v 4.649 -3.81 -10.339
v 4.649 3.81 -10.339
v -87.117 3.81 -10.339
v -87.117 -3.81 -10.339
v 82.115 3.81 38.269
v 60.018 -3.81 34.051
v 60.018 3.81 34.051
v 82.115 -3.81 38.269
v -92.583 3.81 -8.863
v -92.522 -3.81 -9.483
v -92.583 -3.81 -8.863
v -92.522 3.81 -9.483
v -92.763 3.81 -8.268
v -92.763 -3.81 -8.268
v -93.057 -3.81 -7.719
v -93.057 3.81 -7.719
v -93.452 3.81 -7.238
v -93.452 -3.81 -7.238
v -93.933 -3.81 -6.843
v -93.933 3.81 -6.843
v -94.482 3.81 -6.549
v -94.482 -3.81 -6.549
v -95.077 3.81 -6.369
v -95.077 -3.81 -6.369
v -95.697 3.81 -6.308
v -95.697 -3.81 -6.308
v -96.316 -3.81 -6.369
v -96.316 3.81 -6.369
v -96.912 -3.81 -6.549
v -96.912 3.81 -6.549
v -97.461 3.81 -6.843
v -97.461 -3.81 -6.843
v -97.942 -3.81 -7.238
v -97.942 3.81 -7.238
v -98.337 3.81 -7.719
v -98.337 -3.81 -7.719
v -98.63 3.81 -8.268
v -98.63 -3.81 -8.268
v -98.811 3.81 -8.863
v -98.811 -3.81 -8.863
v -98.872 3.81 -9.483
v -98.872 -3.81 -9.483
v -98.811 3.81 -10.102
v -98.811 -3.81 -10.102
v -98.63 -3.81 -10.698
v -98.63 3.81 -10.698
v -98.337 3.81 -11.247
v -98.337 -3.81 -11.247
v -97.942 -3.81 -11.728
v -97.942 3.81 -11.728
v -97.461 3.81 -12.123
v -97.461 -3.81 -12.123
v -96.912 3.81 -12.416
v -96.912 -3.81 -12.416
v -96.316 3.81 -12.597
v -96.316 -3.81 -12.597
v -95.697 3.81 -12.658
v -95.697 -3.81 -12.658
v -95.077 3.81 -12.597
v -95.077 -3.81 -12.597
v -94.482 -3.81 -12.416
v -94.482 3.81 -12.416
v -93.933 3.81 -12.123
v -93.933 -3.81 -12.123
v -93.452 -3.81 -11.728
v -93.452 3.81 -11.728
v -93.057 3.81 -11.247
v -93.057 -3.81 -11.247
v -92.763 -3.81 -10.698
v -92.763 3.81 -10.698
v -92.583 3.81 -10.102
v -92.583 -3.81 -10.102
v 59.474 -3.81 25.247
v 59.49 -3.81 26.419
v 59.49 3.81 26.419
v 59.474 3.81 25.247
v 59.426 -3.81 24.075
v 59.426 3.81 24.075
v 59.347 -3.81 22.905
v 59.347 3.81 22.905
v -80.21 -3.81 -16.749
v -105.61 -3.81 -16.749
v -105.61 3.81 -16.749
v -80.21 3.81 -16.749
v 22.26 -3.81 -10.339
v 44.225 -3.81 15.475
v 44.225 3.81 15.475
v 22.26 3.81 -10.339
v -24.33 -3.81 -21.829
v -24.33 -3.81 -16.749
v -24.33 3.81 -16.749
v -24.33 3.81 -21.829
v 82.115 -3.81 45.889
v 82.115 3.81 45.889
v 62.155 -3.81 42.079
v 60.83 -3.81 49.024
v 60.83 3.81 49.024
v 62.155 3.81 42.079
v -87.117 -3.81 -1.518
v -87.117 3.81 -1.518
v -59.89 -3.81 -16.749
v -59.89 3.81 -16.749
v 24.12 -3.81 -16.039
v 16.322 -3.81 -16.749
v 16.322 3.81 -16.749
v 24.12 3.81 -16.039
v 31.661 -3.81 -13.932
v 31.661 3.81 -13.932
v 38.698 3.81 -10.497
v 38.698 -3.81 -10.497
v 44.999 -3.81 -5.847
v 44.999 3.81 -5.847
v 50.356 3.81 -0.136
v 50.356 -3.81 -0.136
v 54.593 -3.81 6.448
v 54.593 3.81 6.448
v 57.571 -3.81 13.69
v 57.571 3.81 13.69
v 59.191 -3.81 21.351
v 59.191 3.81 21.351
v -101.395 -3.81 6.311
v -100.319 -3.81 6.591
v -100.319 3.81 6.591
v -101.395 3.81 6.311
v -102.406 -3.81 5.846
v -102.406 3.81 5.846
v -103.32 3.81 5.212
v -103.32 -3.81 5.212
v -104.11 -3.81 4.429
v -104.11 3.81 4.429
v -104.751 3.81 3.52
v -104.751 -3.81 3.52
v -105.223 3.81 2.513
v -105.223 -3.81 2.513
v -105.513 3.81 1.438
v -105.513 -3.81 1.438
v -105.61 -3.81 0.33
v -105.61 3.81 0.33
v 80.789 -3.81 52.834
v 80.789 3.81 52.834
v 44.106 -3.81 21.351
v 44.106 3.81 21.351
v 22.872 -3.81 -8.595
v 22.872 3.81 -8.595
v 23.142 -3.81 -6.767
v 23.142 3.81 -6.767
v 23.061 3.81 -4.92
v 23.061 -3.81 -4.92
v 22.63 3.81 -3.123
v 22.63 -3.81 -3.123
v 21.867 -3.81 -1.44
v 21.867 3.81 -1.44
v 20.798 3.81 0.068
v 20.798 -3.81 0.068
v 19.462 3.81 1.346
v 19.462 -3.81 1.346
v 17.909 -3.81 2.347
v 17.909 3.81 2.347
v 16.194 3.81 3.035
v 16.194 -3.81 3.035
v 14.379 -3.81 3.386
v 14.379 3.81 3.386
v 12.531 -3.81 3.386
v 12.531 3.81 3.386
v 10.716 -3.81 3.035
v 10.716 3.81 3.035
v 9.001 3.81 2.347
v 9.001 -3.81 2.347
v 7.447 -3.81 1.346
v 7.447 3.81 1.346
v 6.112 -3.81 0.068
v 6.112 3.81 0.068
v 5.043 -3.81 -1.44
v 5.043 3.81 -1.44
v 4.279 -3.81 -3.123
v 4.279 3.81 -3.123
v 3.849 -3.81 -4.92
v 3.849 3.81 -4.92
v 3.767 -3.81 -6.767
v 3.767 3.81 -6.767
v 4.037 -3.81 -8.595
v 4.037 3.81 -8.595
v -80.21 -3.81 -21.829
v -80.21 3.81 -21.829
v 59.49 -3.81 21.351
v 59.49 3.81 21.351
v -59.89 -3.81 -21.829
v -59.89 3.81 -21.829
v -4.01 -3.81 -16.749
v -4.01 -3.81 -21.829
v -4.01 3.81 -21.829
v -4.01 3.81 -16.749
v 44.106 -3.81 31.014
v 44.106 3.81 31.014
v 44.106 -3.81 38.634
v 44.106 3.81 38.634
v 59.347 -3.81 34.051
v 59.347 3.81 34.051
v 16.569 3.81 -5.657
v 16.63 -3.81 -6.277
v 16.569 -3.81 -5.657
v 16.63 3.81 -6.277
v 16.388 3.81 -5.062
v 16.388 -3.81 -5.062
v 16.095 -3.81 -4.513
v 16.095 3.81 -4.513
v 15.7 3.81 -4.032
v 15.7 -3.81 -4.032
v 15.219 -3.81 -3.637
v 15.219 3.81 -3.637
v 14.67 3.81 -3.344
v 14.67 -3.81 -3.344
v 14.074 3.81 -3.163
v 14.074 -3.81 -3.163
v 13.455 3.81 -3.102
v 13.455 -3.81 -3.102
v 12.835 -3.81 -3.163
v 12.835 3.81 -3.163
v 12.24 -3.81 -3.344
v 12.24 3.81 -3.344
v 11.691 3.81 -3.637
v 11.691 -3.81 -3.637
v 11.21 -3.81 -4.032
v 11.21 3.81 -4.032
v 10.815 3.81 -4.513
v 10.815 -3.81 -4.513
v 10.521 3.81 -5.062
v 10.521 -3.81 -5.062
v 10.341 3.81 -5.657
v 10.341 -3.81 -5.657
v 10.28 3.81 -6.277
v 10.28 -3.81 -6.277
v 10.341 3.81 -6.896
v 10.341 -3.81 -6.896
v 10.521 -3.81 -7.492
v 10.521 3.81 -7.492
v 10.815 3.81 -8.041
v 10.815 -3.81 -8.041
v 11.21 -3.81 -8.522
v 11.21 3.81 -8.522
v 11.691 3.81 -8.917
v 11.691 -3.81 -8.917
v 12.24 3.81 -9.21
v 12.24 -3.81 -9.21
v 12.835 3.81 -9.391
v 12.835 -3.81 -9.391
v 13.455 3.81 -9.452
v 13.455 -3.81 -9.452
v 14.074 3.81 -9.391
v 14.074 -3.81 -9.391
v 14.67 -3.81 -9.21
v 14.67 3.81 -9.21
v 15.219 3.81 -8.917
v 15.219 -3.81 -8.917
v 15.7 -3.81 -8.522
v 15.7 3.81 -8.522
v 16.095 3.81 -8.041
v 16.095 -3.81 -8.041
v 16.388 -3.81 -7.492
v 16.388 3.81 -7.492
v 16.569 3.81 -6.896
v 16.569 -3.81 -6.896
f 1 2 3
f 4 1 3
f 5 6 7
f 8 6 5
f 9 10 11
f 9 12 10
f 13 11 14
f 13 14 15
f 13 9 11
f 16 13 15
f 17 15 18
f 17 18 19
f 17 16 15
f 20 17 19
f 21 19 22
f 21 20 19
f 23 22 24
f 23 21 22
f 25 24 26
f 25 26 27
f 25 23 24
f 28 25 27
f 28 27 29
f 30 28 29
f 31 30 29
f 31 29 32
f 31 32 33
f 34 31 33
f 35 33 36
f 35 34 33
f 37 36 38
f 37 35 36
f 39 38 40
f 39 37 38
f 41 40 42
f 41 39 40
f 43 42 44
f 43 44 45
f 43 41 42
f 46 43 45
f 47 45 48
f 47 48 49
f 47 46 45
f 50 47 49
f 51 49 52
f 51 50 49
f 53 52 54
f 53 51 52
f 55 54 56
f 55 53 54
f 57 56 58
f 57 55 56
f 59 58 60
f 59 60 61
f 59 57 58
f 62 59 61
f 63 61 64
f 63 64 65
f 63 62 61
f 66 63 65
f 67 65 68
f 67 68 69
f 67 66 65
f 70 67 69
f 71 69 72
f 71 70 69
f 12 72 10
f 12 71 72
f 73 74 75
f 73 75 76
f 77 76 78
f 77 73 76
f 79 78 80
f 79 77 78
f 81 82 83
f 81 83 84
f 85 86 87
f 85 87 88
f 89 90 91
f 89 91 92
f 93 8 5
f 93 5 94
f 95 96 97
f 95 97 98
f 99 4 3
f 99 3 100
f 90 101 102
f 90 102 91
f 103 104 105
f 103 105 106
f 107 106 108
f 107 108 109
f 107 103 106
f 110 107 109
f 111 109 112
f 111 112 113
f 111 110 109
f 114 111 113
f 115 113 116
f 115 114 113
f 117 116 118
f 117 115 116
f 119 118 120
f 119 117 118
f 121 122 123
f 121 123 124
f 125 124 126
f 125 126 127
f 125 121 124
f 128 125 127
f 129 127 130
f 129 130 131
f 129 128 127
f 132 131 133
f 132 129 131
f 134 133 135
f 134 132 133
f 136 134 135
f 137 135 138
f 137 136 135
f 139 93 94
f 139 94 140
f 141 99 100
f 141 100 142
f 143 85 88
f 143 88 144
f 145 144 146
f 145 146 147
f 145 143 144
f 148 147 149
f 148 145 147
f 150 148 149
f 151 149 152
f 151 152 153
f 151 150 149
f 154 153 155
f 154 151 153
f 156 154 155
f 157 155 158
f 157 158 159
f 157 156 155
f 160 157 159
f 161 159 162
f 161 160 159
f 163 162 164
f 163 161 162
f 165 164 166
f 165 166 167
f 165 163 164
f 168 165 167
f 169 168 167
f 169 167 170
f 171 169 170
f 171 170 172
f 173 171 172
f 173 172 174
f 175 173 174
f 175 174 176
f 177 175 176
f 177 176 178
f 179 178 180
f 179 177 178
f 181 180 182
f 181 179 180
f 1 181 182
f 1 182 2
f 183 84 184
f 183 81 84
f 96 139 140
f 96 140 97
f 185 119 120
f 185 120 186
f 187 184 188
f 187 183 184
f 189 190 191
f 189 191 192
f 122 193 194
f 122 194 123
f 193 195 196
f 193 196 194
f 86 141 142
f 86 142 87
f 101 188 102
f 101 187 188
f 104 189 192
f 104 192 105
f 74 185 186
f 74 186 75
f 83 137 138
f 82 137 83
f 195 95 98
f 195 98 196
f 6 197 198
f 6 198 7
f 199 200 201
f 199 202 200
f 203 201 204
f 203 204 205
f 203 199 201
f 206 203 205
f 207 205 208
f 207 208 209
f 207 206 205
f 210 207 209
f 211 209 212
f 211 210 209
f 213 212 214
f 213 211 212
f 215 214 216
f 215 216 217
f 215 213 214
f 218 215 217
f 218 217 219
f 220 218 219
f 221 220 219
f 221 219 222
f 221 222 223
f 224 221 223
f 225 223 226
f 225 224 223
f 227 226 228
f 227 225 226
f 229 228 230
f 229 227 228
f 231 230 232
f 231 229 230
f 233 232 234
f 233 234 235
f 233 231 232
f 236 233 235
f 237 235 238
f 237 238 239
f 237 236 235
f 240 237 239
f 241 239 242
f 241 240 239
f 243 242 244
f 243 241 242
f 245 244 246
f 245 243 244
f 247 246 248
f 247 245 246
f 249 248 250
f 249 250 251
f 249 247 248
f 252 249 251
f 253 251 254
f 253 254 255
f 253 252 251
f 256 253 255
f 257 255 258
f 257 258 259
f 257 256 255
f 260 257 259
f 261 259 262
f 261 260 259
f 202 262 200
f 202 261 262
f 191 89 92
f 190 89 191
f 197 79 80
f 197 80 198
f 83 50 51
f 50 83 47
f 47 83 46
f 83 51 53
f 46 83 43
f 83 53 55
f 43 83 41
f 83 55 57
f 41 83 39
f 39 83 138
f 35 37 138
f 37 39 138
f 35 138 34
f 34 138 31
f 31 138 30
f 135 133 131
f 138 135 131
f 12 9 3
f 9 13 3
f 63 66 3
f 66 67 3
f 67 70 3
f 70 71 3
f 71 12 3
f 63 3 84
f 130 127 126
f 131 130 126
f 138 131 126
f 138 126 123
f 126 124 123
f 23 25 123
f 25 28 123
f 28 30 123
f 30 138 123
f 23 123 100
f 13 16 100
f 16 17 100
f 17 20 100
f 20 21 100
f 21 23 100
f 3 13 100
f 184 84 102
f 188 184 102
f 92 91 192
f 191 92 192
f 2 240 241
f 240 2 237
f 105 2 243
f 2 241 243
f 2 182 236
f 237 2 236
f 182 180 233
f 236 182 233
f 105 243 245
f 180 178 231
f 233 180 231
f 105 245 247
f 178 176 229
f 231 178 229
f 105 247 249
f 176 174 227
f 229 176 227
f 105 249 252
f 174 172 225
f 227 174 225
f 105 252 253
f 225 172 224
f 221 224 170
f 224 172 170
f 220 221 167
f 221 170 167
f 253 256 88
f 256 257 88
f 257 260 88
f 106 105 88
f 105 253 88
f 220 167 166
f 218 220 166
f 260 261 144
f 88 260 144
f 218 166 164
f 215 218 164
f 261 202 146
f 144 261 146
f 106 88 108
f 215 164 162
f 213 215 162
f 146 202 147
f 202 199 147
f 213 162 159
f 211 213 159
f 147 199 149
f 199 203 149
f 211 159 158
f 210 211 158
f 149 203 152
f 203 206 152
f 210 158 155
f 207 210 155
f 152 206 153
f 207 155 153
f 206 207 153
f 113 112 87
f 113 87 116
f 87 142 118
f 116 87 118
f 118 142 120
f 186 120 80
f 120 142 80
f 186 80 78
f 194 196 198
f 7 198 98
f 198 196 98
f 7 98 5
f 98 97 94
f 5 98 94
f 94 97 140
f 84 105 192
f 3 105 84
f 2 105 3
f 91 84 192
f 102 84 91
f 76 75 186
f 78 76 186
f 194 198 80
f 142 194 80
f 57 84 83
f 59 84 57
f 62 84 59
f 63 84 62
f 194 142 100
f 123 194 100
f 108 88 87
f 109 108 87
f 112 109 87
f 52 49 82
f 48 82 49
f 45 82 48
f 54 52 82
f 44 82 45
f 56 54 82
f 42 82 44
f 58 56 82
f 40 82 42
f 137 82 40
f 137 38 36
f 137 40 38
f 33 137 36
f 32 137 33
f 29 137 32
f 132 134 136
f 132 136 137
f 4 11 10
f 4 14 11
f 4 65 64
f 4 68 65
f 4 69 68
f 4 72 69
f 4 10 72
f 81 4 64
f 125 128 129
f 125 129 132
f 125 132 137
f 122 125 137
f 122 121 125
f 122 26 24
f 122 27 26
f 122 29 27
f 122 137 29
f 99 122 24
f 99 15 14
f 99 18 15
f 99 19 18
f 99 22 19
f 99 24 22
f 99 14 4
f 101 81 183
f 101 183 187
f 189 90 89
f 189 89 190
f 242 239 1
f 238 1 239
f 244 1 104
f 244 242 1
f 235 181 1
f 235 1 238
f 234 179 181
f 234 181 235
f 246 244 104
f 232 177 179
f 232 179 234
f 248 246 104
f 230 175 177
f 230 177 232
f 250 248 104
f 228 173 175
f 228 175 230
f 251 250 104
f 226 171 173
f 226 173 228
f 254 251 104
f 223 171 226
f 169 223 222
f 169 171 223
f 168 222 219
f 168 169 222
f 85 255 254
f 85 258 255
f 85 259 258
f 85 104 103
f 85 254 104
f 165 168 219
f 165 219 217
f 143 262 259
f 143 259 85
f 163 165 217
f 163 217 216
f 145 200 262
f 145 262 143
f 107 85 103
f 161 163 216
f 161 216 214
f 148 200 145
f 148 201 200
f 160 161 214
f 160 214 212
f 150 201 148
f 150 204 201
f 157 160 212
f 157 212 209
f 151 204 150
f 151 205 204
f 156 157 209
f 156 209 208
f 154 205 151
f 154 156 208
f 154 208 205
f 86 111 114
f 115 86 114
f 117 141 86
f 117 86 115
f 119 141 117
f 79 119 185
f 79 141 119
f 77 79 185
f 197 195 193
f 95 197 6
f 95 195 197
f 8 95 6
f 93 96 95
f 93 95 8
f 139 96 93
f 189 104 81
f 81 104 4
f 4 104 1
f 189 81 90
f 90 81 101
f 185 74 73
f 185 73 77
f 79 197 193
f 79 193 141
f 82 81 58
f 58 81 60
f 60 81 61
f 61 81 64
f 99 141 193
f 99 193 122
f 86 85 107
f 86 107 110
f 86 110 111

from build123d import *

# Parameters (mm, degrees)
F0_R     = 3.175
F1_DEPTH = 3.81


with BuildPart() as f1:
    # F0 (on Front) → F1 (new body, symmetric)
    with BuildSketch(Plane.XZ):
        with BuildLine():
            Line((-59.890088, -21.828954), (-59.890088, -16.748955))
            Line((-59.890088, -16.748955), (-24.330088, -16.748955))
            Line((-24.330088, -16.748955), (-24.330088, -21.828954))
            Line((-24.330088, -21.828954), (-4.010088, -21.828954))
            Line((-4.010088, -21.828954), (-4.010088, -16.748955))
            Line((-4.010088, -16.748955), (16.322047, -16.748955))
            ThreePointArc((16.322047, -16.748955), (44.998655, -5.847431), (59.191398, 21.351045))
            ThreePointArc((59.191398, 21.351045), (59.276078, 22.127556), (59.346694, 22.905473))
            Line((59.346694, 22.905473), (59.346694, 34.051045))
            Line((59.346694, 34.051045), (60.017541, 34.051045))
            Line((60.017541, 34.051045), (82.11488, 38.268742))
            Line((82.11488, 38.268742), (82.11488, 45.888742))
            Line((82.11488, 45.888742), (80.789338, 52.833516))
            Line((80.789338, 52.833516), (60.82966, 49.023833))
            Line((60.82966, 49.023833), (62.155202, 42.079058))
            Line((62.155202, 42.079058), (44.106369, 38.634096))
            Line((44.106369, 38.634096), (44.106369, 31.014096))
            Line((44.106369, 31.014096), (-100.318861, 6.59136))
            ThreePointArc((-100.318861, 6.59136), (-104.110125, 4.428987), (-105.610088, 0.33025))
            Line((-105.610088, 0.33025), (-105.610088, -16.748954))
            Line((-105.610088, -16.748954), (-80.210088, -16.748954))
            Line((-80.210088, -16.748954), (-80.210088, -21.828954))
            Line((-80.210088, -21.828954), (-59.890088, -21.828954))
        make_face()
        with Locations((-95.69665, -9.482743)):
            Circle(F0_R, mode=Mode.SUBTRACT)
        with BuildLine():
            Line((-87.117024, -1.517896), (44.106369, 21.351045))
            Line((44.106369, 21.351045), (44.224798, 15.474893))
            Line((44.224798, 15.474893), (22.260441, -10.339289))
            ThreePointArc((22.260441, -10.339289), (13.454788, 3.430057), (4.649135, -10.339289))
            Line((4.649135, -10.339289), (-87.117024, -10.339289))
            Line((-87.117024, -10.339289), (-87.117024, -1.517896))
        make_face(mode=Mode.SUBTRACT)
        with Locations((13.454788, -6.276863)):
            Circle(F0_R, mode=Mode.SUBTRACT)
        with BuildLine():
            ThreePointArc((59.346694, 22.905473), (59.276078, 22.127556), (59.191398, 21.351045))
            Line((59.191398, 21.351045), (59.346694, 21.351045))
            Line((59.346694, 21.351045), (59.346694, 22.905473))
        make_face()
        with BuildLine():
            ThreePointArc((59.489912, 26.418909), (59.454092, 24.660732), (59.346694, 22.905473))
            Line((59.346694, 22.905473), (59.346694, 21.351045))
            Line((59.346694, 21.351045), (59.489912, 21.351045))
            Line((59.489912, 21.351045), (59.489912, 26.418909))
        make_face()
    extrude(amount=F1_DEPTH, both=True)


solid = f1.part
